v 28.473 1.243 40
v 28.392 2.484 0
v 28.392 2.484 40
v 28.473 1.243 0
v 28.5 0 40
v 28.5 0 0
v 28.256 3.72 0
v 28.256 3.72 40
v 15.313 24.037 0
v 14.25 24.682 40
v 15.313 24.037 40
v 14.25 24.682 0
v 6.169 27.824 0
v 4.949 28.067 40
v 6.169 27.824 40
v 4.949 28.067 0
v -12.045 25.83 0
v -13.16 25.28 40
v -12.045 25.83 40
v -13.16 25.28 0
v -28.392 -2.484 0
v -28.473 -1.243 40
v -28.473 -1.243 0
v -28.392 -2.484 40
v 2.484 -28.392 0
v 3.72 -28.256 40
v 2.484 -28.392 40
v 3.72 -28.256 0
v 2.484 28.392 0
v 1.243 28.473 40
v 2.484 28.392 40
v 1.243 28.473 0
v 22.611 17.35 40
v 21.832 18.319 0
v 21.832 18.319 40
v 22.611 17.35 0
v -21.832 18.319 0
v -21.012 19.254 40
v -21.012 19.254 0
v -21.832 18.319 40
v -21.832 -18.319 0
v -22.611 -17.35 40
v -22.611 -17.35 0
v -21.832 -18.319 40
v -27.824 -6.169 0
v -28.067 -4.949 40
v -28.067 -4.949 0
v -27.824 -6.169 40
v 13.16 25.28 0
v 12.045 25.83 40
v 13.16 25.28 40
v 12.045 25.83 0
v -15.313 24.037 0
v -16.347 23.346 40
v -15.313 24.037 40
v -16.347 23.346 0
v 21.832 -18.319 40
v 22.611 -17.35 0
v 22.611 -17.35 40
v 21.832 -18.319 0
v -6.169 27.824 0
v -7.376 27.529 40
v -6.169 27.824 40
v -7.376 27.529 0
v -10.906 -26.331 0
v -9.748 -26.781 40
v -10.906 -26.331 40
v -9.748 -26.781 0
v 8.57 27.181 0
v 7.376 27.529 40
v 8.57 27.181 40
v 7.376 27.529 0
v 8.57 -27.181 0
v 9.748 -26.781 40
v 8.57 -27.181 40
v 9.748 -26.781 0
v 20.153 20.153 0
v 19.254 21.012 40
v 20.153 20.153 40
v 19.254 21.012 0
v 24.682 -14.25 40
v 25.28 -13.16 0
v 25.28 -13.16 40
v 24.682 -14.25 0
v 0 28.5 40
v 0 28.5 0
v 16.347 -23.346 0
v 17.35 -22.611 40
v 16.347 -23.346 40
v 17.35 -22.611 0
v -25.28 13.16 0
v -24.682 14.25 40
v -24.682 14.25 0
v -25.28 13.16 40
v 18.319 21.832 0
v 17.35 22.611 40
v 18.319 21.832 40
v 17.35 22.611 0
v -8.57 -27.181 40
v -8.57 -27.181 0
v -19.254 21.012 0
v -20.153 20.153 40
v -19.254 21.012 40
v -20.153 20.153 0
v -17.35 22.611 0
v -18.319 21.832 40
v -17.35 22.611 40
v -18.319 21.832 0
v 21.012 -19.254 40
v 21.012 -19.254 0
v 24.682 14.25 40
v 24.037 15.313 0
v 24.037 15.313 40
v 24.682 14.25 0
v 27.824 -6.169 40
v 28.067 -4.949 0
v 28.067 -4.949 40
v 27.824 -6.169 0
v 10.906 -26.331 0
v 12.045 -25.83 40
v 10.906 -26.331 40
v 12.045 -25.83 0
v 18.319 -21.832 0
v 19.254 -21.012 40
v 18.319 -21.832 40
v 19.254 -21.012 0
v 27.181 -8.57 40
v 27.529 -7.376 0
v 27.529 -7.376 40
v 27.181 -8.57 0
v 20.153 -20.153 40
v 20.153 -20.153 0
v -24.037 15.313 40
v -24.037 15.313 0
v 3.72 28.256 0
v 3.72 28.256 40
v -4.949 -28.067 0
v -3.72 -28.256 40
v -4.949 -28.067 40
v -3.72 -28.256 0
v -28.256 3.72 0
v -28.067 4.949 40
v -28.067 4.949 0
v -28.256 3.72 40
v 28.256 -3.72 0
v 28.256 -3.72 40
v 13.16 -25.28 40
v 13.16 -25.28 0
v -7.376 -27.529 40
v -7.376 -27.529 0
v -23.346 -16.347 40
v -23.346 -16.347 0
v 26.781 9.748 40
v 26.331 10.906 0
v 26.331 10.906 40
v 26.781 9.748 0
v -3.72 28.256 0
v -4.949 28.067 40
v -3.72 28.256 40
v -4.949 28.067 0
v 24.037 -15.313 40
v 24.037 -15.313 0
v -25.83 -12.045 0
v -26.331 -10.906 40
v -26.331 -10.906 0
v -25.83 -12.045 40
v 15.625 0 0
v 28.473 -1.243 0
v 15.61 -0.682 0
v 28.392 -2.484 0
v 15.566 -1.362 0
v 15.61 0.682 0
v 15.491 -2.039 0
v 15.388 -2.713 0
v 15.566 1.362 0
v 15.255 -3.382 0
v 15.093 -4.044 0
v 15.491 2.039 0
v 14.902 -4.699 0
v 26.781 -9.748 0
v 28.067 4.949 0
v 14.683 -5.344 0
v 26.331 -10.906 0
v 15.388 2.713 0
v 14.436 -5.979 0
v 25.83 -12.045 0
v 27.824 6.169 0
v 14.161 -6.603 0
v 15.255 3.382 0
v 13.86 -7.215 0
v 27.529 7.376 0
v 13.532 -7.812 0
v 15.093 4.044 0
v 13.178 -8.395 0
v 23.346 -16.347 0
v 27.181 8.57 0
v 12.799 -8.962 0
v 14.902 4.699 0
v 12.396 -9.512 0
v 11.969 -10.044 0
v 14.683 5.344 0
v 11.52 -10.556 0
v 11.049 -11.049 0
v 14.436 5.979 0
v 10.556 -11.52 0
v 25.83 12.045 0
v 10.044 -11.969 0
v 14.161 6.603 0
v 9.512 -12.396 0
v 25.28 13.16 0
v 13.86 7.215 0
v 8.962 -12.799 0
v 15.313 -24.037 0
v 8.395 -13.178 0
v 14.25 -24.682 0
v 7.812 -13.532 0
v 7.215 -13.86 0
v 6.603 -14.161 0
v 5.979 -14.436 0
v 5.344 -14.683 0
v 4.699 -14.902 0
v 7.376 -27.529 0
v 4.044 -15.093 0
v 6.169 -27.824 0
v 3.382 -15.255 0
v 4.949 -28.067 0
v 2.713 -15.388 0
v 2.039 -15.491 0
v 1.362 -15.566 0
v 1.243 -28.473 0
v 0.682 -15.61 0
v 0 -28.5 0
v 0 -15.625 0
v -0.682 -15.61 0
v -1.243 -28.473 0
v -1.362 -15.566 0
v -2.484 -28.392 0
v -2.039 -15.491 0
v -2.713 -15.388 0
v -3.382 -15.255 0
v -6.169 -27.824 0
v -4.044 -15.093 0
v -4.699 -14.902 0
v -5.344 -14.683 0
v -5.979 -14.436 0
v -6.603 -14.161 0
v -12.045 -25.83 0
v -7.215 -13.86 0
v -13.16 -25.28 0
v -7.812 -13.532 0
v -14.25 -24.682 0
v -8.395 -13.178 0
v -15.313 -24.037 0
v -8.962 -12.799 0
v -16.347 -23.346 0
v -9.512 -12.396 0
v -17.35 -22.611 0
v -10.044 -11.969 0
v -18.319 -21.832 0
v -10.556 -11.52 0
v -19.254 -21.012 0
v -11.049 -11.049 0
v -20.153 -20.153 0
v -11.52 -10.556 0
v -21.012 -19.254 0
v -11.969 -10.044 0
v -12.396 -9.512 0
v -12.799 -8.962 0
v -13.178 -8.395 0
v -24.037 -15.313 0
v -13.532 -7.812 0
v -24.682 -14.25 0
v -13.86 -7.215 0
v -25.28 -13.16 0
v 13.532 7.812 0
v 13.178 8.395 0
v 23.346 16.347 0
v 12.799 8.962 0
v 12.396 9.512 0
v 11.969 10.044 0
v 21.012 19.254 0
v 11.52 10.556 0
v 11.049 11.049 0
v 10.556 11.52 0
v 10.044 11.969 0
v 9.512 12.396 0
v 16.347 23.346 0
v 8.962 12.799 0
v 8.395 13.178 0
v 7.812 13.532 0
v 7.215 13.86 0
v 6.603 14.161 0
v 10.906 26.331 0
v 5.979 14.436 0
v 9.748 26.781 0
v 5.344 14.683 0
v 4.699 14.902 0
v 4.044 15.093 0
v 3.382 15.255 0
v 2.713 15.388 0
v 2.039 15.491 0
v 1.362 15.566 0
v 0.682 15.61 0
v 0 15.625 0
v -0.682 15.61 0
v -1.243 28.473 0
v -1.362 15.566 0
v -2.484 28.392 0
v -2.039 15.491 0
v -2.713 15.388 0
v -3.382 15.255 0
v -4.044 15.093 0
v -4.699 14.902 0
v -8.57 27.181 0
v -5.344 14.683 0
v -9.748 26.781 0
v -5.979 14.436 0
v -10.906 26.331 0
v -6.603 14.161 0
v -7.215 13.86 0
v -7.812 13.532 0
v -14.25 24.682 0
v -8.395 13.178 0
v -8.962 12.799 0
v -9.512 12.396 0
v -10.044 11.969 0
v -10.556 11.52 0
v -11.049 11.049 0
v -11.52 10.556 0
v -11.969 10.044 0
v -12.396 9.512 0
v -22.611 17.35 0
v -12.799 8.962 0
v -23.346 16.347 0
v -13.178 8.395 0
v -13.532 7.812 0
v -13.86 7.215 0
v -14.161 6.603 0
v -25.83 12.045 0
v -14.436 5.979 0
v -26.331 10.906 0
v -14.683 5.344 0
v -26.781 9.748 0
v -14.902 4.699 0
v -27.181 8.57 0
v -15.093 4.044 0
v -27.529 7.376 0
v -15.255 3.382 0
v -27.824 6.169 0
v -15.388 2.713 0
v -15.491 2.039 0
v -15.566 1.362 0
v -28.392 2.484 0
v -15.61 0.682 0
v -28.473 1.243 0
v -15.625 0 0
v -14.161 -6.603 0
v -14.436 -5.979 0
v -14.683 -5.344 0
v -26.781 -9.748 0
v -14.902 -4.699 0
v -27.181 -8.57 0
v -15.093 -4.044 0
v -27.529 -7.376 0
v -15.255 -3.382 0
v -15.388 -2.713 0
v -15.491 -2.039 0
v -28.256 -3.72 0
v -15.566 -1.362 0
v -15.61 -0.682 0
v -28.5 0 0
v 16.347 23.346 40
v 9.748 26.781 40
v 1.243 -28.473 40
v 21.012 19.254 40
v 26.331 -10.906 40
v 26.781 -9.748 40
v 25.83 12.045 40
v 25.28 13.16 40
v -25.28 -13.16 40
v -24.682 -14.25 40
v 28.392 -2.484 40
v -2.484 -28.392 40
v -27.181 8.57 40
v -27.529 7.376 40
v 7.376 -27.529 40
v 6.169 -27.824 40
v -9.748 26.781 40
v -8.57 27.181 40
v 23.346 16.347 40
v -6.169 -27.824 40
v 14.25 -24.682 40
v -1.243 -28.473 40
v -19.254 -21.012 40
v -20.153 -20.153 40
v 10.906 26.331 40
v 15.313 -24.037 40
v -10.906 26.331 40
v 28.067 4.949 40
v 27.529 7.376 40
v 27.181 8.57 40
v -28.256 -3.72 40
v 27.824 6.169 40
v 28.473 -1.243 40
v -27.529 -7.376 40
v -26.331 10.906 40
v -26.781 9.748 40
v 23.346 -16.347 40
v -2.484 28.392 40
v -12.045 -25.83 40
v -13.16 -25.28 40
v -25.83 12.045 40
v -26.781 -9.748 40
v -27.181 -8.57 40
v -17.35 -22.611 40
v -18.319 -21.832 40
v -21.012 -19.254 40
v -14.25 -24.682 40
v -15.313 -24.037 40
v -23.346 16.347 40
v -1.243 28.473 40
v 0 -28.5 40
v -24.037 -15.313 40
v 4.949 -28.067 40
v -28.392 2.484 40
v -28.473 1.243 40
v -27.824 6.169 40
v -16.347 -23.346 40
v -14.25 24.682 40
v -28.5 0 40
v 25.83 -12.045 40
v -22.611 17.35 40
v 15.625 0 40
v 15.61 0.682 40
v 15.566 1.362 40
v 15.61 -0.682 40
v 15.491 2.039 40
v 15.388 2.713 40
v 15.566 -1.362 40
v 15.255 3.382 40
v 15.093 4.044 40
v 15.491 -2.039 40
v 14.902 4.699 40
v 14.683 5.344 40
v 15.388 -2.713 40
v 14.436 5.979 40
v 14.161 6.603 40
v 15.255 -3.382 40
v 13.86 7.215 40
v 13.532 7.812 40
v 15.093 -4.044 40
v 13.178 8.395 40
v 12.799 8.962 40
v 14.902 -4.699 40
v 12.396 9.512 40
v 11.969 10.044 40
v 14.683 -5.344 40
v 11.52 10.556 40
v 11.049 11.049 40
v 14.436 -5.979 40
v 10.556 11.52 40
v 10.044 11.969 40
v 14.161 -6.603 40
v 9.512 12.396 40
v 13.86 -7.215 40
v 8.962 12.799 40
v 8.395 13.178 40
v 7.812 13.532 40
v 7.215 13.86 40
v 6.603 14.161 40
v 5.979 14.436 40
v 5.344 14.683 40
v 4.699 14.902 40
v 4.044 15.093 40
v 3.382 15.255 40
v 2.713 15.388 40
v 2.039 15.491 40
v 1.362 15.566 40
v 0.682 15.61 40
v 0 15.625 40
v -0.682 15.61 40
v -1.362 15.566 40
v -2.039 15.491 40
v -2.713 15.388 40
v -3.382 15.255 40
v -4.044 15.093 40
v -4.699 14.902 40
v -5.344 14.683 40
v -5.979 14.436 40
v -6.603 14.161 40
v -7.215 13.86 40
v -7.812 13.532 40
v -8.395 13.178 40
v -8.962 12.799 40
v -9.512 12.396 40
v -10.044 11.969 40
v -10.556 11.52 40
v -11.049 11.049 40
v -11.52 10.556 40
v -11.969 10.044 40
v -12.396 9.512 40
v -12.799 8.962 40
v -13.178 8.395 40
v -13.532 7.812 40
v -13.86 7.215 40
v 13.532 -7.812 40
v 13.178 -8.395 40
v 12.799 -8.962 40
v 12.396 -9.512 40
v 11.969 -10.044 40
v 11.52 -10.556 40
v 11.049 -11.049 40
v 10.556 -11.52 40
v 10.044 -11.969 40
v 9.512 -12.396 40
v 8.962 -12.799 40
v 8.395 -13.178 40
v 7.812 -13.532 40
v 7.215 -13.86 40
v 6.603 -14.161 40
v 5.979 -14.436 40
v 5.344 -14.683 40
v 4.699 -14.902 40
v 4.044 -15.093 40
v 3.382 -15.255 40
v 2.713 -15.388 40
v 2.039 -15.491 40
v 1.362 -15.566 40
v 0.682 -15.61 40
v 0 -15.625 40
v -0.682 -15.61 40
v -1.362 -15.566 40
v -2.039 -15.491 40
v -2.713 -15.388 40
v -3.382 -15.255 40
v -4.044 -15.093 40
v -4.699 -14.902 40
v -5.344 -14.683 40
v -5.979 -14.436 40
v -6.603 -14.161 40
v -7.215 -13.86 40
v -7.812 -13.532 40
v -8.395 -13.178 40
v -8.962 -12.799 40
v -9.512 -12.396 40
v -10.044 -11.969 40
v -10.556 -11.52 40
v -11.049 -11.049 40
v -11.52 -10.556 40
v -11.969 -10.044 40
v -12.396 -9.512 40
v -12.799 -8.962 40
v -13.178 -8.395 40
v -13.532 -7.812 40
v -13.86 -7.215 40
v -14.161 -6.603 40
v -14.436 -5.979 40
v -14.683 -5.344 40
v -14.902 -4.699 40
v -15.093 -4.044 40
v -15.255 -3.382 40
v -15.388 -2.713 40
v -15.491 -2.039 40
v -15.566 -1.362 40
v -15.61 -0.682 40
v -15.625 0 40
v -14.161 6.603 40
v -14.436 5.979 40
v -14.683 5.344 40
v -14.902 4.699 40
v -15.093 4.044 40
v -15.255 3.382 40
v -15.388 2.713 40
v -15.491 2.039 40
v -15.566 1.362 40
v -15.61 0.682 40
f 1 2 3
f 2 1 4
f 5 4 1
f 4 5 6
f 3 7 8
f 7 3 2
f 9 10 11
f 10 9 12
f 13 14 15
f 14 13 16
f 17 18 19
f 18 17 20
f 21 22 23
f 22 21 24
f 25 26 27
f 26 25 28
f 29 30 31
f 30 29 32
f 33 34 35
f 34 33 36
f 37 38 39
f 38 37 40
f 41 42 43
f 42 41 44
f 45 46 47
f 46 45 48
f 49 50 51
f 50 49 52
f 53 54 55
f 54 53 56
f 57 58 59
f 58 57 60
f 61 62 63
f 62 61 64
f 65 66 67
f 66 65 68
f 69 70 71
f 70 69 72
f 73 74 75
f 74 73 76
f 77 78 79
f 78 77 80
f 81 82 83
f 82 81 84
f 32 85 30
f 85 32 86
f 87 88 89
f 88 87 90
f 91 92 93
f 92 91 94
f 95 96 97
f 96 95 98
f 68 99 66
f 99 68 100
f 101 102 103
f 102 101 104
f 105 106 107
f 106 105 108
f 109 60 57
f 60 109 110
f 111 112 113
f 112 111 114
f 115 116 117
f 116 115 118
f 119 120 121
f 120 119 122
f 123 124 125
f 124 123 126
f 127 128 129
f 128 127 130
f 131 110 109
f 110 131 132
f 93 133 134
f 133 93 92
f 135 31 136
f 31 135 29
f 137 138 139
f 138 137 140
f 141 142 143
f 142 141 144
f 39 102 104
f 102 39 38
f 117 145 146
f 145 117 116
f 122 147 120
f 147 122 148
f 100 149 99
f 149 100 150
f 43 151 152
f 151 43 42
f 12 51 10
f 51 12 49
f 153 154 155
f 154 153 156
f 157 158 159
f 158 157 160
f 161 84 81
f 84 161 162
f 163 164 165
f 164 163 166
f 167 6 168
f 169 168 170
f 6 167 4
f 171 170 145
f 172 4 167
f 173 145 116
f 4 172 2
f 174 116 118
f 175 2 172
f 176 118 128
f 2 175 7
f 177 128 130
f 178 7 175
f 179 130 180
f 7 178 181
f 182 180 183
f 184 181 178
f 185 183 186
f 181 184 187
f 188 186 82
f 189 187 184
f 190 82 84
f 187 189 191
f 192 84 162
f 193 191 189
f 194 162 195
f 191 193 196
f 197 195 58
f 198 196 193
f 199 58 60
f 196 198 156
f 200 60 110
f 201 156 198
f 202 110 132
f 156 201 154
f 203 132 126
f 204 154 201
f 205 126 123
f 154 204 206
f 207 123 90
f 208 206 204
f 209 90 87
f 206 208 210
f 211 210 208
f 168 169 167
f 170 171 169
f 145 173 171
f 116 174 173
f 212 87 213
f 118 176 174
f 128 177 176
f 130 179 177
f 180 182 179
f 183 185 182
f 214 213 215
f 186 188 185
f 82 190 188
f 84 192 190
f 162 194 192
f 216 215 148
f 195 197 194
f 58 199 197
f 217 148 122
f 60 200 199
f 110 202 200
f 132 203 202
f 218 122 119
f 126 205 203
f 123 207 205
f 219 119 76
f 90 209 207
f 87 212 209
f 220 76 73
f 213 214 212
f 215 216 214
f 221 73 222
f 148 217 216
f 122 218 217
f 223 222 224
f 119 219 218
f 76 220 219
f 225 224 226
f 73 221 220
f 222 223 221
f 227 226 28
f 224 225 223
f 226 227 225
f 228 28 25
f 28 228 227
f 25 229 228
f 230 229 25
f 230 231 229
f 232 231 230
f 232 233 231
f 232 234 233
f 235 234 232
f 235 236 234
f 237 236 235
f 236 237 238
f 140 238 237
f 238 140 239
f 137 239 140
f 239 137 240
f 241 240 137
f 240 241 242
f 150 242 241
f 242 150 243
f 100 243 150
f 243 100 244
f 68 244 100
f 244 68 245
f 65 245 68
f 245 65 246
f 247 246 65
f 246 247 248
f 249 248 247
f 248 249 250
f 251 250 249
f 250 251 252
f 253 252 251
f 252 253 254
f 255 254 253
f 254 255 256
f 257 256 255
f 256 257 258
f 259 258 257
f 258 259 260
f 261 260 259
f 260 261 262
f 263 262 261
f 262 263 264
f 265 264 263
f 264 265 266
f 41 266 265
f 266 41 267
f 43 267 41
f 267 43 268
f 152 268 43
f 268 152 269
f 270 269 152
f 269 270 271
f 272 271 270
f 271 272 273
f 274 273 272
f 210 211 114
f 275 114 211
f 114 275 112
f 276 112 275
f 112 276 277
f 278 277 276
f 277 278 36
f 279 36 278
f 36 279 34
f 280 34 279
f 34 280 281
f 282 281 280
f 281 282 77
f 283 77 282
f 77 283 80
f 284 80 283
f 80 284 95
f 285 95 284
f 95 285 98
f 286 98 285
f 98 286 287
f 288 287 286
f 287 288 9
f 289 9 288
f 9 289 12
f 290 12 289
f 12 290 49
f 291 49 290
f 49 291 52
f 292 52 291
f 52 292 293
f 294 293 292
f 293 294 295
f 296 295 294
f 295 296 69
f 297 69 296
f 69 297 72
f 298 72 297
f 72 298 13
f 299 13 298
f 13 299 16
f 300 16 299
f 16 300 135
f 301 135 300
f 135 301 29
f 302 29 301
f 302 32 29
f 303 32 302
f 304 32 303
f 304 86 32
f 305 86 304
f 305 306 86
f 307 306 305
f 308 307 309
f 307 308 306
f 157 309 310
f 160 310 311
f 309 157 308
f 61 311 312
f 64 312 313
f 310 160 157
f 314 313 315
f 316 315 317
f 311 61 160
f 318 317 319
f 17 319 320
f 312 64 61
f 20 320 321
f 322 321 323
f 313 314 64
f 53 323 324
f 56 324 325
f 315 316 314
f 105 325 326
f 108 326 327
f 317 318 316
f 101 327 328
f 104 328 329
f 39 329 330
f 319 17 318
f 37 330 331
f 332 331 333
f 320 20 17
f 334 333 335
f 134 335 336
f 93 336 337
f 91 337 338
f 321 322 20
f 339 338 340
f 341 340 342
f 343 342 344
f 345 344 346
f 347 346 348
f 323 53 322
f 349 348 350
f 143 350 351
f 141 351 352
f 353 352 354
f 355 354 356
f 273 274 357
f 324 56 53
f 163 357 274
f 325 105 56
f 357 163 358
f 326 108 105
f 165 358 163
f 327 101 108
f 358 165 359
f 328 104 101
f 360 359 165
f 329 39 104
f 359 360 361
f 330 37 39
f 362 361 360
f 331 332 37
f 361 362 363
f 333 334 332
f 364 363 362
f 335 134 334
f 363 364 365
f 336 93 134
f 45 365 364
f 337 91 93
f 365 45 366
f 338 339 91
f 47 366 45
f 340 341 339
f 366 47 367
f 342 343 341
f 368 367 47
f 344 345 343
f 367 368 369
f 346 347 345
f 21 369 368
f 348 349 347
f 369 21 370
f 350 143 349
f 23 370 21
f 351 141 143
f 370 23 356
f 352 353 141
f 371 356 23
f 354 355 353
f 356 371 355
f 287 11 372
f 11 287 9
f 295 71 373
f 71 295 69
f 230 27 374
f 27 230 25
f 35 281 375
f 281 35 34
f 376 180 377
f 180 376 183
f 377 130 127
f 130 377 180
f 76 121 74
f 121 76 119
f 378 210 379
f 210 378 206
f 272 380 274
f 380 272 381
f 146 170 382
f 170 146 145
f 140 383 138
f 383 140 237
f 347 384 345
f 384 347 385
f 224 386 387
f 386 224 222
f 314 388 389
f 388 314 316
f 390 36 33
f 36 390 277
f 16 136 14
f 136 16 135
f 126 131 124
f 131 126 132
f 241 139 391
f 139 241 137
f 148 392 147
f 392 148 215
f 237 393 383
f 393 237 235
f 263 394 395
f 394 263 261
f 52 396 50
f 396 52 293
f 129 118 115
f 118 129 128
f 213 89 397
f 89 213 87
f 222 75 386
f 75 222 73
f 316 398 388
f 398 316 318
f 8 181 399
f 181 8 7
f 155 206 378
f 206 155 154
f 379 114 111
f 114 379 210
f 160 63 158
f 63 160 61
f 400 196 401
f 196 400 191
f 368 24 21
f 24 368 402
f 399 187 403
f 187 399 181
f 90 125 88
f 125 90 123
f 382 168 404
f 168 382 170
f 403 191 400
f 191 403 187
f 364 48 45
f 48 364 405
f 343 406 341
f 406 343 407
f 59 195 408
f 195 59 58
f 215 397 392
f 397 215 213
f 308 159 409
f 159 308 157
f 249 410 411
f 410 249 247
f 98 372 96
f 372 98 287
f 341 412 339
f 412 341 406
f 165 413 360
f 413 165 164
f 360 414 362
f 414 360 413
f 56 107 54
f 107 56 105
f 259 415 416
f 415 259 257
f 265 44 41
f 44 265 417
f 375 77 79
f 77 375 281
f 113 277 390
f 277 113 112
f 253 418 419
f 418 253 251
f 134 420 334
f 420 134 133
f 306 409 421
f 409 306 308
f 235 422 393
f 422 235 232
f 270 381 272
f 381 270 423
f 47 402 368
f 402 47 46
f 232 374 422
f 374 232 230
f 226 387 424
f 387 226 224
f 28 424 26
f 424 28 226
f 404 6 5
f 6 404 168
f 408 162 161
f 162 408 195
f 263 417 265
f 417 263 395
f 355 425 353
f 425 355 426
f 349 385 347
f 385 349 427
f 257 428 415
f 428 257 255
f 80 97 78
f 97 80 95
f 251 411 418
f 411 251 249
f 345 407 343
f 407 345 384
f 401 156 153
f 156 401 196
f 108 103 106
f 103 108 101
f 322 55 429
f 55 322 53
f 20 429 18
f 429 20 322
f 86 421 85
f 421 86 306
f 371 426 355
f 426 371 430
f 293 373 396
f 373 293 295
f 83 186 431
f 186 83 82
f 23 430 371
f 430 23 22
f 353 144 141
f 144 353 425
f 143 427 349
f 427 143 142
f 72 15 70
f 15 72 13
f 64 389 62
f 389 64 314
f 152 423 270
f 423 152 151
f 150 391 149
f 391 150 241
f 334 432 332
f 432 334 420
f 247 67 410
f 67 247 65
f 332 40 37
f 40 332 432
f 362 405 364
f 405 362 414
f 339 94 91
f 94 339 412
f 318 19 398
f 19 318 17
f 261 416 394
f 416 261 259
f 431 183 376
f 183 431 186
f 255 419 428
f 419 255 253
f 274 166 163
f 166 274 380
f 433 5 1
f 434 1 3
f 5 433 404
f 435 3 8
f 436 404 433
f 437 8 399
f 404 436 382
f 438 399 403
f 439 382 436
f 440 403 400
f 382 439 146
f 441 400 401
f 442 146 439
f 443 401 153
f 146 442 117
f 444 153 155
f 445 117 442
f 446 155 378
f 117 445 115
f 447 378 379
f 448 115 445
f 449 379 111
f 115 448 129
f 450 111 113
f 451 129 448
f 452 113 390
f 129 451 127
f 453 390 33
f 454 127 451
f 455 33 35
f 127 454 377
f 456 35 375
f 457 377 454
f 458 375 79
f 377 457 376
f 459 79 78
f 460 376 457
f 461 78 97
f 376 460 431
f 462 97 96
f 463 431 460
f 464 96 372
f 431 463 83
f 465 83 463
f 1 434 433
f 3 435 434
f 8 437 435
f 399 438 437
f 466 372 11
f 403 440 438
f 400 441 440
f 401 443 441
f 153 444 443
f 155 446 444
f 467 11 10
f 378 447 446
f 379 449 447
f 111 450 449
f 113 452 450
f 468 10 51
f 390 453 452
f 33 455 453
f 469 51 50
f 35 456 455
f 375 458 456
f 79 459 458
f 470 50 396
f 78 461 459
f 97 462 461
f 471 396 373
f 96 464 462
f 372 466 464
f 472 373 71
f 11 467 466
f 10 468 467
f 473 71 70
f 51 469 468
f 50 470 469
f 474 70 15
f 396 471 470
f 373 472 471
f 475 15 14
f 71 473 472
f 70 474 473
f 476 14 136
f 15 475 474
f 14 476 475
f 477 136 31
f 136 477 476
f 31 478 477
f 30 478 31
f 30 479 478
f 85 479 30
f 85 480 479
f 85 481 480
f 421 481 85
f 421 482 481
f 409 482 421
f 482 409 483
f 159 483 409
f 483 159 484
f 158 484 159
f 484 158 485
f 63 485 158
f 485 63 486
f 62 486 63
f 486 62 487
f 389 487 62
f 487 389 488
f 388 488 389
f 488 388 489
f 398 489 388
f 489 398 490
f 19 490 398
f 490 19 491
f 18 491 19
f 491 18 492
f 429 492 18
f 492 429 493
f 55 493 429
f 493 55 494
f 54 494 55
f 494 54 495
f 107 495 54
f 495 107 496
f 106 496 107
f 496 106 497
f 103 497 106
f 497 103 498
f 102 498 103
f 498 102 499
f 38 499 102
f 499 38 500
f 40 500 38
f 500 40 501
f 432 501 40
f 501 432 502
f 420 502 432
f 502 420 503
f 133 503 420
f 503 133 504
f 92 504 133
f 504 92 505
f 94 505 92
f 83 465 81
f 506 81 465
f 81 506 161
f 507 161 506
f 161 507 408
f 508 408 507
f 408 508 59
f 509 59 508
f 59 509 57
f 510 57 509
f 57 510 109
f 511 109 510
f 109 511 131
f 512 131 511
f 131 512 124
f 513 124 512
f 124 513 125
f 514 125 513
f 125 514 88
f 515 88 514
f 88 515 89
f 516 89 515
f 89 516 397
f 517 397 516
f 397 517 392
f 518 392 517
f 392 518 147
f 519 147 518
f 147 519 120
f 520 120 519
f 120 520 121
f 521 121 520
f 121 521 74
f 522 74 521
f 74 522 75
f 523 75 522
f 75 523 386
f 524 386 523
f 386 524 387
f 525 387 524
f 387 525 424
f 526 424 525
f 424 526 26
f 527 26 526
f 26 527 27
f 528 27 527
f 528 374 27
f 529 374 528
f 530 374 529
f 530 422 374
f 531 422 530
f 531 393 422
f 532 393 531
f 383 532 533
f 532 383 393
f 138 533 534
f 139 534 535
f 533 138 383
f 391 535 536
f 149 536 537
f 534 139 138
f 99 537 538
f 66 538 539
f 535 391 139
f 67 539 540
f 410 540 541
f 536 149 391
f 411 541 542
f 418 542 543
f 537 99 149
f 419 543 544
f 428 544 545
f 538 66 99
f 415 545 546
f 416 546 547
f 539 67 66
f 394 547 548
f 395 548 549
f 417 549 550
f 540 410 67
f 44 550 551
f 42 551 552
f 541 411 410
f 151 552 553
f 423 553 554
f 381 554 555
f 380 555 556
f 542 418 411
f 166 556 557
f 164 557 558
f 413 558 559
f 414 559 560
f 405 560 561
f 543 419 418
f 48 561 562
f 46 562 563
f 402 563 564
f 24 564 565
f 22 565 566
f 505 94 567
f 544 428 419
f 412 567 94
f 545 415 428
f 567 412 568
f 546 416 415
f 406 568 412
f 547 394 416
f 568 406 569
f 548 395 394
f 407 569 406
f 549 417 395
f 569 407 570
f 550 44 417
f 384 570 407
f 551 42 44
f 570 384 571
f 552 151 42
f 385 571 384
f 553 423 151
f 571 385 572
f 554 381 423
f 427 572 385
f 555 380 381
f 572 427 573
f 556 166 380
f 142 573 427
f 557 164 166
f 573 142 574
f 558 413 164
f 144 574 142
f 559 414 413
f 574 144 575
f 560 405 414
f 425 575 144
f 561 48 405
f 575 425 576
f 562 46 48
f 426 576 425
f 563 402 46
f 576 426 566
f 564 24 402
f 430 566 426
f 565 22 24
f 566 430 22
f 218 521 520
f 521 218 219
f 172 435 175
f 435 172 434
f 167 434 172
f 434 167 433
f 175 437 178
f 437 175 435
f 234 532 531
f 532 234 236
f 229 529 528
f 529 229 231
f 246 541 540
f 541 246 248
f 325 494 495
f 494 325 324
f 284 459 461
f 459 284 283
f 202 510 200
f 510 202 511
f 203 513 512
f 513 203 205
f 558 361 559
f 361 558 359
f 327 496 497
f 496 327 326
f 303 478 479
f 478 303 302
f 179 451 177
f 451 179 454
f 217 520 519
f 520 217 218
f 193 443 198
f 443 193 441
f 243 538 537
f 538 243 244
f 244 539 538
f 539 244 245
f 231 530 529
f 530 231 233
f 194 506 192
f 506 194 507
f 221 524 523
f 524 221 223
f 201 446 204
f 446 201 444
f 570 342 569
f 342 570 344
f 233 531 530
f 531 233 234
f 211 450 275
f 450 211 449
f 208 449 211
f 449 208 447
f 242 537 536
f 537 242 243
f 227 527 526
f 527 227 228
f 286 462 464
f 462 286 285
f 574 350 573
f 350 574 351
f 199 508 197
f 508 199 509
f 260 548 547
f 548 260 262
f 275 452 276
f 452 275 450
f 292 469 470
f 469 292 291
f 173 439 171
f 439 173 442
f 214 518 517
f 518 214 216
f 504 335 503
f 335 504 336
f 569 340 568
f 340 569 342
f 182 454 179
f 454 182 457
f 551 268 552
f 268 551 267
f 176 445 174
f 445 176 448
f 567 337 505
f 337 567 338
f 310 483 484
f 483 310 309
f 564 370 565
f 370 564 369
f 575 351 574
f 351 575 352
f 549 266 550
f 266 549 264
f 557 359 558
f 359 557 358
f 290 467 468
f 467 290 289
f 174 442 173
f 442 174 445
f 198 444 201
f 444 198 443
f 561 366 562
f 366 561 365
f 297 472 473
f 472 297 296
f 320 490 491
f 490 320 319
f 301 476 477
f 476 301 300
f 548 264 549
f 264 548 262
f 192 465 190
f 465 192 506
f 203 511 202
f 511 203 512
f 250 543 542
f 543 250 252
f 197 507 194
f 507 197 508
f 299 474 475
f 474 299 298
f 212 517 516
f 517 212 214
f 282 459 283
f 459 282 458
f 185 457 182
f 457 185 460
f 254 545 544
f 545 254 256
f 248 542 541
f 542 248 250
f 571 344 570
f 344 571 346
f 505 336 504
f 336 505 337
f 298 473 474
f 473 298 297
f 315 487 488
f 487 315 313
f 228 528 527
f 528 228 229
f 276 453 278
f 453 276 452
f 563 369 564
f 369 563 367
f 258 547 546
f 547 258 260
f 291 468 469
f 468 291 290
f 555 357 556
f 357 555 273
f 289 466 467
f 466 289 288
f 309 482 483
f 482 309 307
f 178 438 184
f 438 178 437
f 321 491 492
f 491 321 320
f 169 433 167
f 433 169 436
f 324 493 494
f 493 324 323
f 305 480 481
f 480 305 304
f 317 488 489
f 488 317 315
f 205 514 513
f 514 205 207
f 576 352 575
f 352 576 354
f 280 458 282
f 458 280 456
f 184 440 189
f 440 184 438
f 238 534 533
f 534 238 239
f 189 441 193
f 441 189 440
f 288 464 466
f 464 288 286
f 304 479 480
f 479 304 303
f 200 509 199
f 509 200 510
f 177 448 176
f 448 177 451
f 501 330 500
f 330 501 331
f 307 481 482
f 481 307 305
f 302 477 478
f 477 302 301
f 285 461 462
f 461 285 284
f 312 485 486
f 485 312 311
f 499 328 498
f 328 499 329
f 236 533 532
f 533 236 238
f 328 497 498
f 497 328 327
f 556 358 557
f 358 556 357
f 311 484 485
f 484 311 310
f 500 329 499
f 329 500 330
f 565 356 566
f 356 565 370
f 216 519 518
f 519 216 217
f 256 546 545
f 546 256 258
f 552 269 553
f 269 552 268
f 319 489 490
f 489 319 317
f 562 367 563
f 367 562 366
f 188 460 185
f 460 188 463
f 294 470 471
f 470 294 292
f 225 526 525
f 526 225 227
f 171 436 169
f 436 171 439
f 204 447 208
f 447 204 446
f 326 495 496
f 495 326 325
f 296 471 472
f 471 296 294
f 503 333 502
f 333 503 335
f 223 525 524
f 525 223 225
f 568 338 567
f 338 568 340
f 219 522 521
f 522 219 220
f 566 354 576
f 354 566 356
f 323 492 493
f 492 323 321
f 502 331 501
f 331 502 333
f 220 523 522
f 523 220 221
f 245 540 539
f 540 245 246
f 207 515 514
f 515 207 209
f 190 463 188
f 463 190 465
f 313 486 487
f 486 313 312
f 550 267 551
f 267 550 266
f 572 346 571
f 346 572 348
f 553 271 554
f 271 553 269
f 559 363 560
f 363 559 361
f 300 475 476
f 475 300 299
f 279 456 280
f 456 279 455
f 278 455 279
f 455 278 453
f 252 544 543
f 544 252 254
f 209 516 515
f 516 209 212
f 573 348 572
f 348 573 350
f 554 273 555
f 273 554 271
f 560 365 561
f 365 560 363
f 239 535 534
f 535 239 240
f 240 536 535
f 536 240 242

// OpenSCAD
// Outer diameter in millimeters - use 57 for standard hose connection for 2 1/4" shop vac
outer = 57;
// Inner diameter in millimeters - use 31.25 for the tapered connector on a 1 1/4" shop vac
inner = 31.25;
// Length of adapter in millimeters
length = 40;

difference() {
cylinder( h=length, r=outer/2, center=false, $fn=144 );
cylinder( h=length, r=inner/2, center=false, $fn=144 );
}
